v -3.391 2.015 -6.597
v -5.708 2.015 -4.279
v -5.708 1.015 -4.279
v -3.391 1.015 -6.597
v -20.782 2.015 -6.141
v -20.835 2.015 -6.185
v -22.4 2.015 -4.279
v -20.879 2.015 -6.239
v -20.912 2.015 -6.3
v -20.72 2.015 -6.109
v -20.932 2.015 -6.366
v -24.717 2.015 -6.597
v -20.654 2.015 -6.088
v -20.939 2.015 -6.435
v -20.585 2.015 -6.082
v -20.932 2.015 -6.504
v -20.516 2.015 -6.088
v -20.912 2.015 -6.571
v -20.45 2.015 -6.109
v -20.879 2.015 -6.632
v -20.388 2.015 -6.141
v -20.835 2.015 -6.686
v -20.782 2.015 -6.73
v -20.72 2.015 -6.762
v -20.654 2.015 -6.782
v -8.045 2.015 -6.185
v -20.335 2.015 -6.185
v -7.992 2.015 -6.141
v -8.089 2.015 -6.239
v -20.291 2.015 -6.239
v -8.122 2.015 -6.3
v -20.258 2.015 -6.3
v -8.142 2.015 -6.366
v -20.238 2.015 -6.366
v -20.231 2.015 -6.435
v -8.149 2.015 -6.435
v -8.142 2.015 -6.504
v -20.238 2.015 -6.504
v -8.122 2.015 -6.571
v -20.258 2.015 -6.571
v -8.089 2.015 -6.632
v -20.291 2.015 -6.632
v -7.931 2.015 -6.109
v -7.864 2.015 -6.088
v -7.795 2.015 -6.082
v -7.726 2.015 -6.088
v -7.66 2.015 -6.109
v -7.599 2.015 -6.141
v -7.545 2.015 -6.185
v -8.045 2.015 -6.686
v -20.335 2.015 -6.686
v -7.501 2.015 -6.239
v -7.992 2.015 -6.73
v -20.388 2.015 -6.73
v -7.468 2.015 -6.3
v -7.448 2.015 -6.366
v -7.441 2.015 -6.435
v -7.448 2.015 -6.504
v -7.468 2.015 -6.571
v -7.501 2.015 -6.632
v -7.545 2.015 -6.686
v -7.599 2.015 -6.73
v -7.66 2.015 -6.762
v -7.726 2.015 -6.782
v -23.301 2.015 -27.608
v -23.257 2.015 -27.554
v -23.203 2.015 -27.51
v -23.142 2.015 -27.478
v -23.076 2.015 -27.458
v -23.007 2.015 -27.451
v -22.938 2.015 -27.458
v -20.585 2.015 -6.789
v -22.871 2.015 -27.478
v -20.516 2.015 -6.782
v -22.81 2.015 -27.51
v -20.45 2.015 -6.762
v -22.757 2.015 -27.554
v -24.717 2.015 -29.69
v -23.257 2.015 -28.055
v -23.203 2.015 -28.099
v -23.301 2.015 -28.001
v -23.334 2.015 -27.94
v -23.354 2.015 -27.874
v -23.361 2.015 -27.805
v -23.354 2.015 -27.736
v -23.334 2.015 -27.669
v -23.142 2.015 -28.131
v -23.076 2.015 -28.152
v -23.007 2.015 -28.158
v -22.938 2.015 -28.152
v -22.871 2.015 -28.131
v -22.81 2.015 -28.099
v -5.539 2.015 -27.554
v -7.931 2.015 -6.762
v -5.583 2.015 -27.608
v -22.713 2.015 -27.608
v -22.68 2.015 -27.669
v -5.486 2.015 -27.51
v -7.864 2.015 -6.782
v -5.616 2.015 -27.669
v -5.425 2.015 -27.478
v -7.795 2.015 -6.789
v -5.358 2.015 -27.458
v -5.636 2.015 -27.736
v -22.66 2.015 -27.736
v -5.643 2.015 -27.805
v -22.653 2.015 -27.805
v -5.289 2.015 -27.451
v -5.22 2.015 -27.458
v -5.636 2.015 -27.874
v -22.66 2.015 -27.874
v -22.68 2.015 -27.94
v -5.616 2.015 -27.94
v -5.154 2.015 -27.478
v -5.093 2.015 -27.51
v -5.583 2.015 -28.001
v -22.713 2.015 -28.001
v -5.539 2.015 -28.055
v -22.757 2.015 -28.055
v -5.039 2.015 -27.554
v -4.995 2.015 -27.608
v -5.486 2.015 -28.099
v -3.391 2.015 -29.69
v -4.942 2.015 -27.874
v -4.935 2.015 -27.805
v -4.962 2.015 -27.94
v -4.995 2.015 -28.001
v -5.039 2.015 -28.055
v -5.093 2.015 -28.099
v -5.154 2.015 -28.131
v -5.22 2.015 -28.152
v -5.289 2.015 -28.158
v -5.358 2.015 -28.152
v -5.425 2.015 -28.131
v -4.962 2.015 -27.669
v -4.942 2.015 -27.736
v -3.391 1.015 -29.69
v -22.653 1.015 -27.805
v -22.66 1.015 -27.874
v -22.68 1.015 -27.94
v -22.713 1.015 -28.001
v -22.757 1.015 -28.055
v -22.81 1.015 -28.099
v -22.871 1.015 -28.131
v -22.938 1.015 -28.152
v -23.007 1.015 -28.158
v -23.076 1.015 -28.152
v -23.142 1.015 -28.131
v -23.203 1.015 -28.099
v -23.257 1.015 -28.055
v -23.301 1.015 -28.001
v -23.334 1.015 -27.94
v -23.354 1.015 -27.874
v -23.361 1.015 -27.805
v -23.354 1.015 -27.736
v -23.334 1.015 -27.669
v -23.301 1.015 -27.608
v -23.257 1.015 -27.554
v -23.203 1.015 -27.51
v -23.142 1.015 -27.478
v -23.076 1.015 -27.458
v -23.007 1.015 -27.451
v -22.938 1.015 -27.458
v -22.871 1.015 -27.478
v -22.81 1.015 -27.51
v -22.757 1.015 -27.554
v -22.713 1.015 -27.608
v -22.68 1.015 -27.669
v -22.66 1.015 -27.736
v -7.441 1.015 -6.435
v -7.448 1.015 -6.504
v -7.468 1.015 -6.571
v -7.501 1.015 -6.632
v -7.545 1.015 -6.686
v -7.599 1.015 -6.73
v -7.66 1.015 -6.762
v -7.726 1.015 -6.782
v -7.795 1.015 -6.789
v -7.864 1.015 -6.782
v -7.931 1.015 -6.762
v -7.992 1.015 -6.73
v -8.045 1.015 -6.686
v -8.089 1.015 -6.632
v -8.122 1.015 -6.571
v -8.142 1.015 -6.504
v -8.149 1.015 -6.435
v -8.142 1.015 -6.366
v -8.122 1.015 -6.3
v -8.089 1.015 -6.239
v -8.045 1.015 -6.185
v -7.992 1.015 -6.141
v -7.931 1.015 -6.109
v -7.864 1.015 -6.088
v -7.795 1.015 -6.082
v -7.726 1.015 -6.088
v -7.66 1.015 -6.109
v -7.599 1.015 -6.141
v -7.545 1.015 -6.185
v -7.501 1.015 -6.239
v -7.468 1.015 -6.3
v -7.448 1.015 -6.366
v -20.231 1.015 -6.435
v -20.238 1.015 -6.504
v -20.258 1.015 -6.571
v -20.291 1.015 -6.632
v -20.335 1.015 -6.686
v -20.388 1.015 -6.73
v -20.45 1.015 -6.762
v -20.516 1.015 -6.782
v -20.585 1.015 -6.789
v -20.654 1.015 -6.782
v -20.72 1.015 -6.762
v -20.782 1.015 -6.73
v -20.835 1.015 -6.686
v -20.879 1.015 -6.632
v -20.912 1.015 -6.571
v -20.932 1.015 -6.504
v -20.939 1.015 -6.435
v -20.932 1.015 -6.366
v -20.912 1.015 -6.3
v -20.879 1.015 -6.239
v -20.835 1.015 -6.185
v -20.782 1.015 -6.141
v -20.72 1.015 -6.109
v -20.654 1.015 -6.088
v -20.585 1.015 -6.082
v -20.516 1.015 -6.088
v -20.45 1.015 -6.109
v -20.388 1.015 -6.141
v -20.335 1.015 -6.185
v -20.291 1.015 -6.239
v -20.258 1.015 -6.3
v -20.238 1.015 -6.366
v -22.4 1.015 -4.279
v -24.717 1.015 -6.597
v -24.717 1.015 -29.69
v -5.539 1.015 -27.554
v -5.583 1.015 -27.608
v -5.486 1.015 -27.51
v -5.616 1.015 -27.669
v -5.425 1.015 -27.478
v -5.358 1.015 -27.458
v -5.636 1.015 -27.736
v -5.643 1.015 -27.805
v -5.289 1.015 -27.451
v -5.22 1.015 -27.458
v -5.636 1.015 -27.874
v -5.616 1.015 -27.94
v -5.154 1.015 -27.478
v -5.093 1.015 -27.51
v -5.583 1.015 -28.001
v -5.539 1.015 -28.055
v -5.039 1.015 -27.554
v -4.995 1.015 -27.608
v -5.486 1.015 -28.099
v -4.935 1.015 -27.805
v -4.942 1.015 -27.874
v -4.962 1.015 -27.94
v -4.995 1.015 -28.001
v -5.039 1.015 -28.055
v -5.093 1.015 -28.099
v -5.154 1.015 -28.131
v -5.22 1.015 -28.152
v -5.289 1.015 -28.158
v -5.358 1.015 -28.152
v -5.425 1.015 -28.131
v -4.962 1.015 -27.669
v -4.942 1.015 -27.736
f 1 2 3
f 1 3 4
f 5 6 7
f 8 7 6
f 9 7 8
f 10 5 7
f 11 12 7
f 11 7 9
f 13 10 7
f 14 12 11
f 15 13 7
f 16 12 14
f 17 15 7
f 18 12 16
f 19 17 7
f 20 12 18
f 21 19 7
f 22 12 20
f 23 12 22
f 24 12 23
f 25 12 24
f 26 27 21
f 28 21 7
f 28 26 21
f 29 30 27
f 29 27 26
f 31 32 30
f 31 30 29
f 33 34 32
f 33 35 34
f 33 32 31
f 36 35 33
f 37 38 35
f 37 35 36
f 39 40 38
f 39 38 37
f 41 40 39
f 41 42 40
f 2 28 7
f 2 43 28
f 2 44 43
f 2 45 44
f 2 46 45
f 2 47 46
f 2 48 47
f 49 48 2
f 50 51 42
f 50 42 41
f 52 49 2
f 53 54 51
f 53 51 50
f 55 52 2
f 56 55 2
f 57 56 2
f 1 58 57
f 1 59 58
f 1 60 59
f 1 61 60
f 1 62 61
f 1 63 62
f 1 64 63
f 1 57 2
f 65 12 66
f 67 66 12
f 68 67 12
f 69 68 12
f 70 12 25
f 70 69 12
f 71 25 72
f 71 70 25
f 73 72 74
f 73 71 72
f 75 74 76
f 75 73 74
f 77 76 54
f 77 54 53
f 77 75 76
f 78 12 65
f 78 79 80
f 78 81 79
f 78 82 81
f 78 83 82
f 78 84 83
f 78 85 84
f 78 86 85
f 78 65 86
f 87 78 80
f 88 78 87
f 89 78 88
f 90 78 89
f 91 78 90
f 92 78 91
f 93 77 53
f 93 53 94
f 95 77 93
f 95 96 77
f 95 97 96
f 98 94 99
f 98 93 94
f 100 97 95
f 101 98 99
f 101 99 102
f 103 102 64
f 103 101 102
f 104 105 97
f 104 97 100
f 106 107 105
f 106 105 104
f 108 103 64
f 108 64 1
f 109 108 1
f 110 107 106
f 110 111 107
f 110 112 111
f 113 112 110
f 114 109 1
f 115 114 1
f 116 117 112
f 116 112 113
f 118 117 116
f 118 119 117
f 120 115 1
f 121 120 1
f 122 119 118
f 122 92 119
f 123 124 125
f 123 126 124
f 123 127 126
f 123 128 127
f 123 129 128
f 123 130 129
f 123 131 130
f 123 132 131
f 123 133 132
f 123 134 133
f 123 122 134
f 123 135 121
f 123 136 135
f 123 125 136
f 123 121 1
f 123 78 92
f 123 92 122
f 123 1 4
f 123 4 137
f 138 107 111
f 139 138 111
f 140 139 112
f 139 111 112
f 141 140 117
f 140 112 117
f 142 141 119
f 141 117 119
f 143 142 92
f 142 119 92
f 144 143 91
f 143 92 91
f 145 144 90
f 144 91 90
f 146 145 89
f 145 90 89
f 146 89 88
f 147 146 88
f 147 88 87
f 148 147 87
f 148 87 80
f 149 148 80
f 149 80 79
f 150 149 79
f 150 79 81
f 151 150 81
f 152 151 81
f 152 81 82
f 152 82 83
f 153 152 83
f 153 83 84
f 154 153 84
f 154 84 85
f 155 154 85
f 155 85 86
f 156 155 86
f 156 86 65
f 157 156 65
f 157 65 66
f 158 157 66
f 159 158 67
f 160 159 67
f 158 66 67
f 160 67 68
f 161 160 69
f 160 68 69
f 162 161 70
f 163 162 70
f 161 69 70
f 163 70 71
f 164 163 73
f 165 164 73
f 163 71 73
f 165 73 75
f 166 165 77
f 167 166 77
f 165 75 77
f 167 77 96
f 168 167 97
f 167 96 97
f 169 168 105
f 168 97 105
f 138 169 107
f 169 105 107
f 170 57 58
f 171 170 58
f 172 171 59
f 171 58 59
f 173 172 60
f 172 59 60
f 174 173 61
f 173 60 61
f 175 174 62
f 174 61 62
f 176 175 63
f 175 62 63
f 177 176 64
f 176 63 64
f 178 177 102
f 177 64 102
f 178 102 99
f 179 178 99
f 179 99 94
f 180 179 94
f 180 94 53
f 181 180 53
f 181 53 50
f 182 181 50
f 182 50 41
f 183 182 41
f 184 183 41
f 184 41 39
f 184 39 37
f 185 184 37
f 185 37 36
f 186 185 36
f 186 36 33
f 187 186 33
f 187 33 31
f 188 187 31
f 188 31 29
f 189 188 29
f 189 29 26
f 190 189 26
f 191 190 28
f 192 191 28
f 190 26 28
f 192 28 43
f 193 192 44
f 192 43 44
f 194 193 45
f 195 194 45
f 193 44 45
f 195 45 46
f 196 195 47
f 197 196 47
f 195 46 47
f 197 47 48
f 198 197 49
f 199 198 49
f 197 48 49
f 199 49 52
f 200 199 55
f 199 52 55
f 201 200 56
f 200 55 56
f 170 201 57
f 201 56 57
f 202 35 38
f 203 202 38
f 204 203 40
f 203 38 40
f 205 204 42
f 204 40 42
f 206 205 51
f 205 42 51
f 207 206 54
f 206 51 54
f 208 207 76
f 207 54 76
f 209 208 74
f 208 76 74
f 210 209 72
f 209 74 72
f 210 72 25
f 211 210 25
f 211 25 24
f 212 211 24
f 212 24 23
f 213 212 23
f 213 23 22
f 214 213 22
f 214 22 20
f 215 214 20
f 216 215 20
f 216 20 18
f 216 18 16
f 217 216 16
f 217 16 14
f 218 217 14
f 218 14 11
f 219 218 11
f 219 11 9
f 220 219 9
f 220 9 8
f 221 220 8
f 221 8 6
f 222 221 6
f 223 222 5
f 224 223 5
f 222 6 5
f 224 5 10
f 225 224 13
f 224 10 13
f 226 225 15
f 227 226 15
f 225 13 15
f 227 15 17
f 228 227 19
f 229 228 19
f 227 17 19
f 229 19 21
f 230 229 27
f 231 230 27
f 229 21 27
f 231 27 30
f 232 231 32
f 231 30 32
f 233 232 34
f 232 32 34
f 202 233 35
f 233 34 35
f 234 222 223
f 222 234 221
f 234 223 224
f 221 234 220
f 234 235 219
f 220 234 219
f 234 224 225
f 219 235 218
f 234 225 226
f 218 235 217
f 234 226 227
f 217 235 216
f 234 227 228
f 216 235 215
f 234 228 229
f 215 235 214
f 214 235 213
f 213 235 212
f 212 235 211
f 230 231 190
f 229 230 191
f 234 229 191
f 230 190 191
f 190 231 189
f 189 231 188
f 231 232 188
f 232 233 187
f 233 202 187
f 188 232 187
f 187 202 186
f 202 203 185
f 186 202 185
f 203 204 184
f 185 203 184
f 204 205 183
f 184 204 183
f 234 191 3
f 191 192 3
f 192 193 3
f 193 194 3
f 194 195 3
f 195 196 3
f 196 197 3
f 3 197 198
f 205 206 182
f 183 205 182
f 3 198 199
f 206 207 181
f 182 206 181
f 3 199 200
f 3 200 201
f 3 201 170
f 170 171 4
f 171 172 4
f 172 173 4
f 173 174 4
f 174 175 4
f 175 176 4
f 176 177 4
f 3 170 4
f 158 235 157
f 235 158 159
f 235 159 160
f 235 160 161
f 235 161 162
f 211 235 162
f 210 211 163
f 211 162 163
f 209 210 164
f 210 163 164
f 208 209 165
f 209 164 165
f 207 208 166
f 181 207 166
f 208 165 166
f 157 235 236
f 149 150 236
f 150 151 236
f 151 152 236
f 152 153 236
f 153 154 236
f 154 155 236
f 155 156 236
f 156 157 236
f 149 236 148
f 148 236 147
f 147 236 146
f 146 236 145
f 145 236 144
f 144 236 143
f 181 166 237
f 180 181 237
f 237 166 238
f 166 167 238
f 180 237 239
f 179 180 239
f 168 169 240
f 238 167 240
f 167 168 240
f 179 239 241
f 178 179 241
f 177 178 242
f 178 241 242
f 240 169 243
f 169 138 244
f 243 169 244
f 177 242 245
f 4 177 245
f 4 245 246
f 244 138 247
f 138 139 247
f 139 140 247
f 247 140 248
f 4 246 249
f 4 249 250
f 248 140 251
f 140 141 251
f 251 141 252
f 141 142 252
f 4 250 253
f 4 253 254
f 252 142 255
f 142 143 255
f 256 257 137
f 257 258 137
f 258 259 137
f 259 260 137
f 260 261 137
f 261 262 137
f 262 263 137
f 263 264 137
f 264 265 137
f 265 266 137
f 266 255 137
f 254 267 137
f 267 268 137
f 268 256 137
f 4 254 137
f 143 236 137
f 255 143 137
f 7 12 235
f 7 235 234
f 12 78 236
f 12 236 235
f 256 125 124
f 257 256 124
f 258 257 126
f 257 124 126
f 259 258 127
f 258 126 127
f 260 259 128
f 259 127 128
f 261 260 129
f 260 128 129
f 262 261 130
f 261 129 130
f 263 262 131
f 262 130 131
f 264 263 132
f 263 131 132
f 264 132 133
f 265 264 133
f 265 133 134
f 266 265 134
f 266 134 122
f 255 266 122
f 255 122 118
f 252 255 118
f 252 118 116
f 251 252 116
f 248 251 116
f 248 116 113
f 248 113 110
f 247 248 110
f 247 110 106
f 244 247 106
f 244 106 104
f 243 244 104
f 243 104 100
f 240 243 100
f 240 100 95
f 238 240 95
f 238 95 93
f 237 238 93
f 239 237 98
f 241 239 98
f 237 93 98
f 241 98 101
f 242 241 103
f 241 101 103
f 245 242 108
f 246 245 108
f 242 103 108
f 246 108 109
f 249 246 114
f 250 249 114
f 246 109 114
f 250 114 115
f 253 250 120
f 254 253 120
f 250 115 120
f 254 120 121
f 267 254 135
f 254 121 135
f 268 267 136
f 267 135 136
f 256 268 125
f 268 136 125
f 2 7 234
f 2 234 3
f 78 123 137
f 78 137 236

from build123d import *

# Parameters (mm, degrees)
BOSS_EXTRUDE3_DEPTH = 1
SKETCH23_R          = 0.353838886
CUT_EXTRUDE13_DEPTH = 4


with BuildPart() as part:
    # Sketch22 → Boss-Extrude3 (new body)
    with BuildSketch(Plane(origin=(0, 2.015360823, 0), x_dir=(1, 0, 0), z_dir=(0, 1, 0))):
        Polygon((-24.716746523, 29.689845928), (-24.716746523, 6.596637121), (-22.39957081, 4.279461407), (-5.708050839, 4.279461407), (-3.390875125, 6.596637121), (-3.390875125, 29.689845928), align=None)
    extrude(amount=-BOSS_EXTRUDE3_DEPTH)

    # Sketch23 → Cut-Extrude13 (cut)
    with BuildSketch(Plane(origin=(0, 2.015360823, 0), x_dir=(1, 0, 0), z_dir=(0, 1, 0))):
        with Locations((-23.006845426, 27.804561031)):
            Circle(SKETCH23_R)
        with Locations((-5.289134614, 27.804561031)):
            Circle(SKETCH23_R)
        with Locations((-20.585001957, 6.435408141)):
            Circle(SKETCH23_R)
        with Locations((-7.795165685, 6.435408141)):
            Circle(SKETCH23_R)
    extrude(amount=-CUT_EXTRUDE13_DEPTH, mode=Mode.SUBTRACT)


solid = part.part
